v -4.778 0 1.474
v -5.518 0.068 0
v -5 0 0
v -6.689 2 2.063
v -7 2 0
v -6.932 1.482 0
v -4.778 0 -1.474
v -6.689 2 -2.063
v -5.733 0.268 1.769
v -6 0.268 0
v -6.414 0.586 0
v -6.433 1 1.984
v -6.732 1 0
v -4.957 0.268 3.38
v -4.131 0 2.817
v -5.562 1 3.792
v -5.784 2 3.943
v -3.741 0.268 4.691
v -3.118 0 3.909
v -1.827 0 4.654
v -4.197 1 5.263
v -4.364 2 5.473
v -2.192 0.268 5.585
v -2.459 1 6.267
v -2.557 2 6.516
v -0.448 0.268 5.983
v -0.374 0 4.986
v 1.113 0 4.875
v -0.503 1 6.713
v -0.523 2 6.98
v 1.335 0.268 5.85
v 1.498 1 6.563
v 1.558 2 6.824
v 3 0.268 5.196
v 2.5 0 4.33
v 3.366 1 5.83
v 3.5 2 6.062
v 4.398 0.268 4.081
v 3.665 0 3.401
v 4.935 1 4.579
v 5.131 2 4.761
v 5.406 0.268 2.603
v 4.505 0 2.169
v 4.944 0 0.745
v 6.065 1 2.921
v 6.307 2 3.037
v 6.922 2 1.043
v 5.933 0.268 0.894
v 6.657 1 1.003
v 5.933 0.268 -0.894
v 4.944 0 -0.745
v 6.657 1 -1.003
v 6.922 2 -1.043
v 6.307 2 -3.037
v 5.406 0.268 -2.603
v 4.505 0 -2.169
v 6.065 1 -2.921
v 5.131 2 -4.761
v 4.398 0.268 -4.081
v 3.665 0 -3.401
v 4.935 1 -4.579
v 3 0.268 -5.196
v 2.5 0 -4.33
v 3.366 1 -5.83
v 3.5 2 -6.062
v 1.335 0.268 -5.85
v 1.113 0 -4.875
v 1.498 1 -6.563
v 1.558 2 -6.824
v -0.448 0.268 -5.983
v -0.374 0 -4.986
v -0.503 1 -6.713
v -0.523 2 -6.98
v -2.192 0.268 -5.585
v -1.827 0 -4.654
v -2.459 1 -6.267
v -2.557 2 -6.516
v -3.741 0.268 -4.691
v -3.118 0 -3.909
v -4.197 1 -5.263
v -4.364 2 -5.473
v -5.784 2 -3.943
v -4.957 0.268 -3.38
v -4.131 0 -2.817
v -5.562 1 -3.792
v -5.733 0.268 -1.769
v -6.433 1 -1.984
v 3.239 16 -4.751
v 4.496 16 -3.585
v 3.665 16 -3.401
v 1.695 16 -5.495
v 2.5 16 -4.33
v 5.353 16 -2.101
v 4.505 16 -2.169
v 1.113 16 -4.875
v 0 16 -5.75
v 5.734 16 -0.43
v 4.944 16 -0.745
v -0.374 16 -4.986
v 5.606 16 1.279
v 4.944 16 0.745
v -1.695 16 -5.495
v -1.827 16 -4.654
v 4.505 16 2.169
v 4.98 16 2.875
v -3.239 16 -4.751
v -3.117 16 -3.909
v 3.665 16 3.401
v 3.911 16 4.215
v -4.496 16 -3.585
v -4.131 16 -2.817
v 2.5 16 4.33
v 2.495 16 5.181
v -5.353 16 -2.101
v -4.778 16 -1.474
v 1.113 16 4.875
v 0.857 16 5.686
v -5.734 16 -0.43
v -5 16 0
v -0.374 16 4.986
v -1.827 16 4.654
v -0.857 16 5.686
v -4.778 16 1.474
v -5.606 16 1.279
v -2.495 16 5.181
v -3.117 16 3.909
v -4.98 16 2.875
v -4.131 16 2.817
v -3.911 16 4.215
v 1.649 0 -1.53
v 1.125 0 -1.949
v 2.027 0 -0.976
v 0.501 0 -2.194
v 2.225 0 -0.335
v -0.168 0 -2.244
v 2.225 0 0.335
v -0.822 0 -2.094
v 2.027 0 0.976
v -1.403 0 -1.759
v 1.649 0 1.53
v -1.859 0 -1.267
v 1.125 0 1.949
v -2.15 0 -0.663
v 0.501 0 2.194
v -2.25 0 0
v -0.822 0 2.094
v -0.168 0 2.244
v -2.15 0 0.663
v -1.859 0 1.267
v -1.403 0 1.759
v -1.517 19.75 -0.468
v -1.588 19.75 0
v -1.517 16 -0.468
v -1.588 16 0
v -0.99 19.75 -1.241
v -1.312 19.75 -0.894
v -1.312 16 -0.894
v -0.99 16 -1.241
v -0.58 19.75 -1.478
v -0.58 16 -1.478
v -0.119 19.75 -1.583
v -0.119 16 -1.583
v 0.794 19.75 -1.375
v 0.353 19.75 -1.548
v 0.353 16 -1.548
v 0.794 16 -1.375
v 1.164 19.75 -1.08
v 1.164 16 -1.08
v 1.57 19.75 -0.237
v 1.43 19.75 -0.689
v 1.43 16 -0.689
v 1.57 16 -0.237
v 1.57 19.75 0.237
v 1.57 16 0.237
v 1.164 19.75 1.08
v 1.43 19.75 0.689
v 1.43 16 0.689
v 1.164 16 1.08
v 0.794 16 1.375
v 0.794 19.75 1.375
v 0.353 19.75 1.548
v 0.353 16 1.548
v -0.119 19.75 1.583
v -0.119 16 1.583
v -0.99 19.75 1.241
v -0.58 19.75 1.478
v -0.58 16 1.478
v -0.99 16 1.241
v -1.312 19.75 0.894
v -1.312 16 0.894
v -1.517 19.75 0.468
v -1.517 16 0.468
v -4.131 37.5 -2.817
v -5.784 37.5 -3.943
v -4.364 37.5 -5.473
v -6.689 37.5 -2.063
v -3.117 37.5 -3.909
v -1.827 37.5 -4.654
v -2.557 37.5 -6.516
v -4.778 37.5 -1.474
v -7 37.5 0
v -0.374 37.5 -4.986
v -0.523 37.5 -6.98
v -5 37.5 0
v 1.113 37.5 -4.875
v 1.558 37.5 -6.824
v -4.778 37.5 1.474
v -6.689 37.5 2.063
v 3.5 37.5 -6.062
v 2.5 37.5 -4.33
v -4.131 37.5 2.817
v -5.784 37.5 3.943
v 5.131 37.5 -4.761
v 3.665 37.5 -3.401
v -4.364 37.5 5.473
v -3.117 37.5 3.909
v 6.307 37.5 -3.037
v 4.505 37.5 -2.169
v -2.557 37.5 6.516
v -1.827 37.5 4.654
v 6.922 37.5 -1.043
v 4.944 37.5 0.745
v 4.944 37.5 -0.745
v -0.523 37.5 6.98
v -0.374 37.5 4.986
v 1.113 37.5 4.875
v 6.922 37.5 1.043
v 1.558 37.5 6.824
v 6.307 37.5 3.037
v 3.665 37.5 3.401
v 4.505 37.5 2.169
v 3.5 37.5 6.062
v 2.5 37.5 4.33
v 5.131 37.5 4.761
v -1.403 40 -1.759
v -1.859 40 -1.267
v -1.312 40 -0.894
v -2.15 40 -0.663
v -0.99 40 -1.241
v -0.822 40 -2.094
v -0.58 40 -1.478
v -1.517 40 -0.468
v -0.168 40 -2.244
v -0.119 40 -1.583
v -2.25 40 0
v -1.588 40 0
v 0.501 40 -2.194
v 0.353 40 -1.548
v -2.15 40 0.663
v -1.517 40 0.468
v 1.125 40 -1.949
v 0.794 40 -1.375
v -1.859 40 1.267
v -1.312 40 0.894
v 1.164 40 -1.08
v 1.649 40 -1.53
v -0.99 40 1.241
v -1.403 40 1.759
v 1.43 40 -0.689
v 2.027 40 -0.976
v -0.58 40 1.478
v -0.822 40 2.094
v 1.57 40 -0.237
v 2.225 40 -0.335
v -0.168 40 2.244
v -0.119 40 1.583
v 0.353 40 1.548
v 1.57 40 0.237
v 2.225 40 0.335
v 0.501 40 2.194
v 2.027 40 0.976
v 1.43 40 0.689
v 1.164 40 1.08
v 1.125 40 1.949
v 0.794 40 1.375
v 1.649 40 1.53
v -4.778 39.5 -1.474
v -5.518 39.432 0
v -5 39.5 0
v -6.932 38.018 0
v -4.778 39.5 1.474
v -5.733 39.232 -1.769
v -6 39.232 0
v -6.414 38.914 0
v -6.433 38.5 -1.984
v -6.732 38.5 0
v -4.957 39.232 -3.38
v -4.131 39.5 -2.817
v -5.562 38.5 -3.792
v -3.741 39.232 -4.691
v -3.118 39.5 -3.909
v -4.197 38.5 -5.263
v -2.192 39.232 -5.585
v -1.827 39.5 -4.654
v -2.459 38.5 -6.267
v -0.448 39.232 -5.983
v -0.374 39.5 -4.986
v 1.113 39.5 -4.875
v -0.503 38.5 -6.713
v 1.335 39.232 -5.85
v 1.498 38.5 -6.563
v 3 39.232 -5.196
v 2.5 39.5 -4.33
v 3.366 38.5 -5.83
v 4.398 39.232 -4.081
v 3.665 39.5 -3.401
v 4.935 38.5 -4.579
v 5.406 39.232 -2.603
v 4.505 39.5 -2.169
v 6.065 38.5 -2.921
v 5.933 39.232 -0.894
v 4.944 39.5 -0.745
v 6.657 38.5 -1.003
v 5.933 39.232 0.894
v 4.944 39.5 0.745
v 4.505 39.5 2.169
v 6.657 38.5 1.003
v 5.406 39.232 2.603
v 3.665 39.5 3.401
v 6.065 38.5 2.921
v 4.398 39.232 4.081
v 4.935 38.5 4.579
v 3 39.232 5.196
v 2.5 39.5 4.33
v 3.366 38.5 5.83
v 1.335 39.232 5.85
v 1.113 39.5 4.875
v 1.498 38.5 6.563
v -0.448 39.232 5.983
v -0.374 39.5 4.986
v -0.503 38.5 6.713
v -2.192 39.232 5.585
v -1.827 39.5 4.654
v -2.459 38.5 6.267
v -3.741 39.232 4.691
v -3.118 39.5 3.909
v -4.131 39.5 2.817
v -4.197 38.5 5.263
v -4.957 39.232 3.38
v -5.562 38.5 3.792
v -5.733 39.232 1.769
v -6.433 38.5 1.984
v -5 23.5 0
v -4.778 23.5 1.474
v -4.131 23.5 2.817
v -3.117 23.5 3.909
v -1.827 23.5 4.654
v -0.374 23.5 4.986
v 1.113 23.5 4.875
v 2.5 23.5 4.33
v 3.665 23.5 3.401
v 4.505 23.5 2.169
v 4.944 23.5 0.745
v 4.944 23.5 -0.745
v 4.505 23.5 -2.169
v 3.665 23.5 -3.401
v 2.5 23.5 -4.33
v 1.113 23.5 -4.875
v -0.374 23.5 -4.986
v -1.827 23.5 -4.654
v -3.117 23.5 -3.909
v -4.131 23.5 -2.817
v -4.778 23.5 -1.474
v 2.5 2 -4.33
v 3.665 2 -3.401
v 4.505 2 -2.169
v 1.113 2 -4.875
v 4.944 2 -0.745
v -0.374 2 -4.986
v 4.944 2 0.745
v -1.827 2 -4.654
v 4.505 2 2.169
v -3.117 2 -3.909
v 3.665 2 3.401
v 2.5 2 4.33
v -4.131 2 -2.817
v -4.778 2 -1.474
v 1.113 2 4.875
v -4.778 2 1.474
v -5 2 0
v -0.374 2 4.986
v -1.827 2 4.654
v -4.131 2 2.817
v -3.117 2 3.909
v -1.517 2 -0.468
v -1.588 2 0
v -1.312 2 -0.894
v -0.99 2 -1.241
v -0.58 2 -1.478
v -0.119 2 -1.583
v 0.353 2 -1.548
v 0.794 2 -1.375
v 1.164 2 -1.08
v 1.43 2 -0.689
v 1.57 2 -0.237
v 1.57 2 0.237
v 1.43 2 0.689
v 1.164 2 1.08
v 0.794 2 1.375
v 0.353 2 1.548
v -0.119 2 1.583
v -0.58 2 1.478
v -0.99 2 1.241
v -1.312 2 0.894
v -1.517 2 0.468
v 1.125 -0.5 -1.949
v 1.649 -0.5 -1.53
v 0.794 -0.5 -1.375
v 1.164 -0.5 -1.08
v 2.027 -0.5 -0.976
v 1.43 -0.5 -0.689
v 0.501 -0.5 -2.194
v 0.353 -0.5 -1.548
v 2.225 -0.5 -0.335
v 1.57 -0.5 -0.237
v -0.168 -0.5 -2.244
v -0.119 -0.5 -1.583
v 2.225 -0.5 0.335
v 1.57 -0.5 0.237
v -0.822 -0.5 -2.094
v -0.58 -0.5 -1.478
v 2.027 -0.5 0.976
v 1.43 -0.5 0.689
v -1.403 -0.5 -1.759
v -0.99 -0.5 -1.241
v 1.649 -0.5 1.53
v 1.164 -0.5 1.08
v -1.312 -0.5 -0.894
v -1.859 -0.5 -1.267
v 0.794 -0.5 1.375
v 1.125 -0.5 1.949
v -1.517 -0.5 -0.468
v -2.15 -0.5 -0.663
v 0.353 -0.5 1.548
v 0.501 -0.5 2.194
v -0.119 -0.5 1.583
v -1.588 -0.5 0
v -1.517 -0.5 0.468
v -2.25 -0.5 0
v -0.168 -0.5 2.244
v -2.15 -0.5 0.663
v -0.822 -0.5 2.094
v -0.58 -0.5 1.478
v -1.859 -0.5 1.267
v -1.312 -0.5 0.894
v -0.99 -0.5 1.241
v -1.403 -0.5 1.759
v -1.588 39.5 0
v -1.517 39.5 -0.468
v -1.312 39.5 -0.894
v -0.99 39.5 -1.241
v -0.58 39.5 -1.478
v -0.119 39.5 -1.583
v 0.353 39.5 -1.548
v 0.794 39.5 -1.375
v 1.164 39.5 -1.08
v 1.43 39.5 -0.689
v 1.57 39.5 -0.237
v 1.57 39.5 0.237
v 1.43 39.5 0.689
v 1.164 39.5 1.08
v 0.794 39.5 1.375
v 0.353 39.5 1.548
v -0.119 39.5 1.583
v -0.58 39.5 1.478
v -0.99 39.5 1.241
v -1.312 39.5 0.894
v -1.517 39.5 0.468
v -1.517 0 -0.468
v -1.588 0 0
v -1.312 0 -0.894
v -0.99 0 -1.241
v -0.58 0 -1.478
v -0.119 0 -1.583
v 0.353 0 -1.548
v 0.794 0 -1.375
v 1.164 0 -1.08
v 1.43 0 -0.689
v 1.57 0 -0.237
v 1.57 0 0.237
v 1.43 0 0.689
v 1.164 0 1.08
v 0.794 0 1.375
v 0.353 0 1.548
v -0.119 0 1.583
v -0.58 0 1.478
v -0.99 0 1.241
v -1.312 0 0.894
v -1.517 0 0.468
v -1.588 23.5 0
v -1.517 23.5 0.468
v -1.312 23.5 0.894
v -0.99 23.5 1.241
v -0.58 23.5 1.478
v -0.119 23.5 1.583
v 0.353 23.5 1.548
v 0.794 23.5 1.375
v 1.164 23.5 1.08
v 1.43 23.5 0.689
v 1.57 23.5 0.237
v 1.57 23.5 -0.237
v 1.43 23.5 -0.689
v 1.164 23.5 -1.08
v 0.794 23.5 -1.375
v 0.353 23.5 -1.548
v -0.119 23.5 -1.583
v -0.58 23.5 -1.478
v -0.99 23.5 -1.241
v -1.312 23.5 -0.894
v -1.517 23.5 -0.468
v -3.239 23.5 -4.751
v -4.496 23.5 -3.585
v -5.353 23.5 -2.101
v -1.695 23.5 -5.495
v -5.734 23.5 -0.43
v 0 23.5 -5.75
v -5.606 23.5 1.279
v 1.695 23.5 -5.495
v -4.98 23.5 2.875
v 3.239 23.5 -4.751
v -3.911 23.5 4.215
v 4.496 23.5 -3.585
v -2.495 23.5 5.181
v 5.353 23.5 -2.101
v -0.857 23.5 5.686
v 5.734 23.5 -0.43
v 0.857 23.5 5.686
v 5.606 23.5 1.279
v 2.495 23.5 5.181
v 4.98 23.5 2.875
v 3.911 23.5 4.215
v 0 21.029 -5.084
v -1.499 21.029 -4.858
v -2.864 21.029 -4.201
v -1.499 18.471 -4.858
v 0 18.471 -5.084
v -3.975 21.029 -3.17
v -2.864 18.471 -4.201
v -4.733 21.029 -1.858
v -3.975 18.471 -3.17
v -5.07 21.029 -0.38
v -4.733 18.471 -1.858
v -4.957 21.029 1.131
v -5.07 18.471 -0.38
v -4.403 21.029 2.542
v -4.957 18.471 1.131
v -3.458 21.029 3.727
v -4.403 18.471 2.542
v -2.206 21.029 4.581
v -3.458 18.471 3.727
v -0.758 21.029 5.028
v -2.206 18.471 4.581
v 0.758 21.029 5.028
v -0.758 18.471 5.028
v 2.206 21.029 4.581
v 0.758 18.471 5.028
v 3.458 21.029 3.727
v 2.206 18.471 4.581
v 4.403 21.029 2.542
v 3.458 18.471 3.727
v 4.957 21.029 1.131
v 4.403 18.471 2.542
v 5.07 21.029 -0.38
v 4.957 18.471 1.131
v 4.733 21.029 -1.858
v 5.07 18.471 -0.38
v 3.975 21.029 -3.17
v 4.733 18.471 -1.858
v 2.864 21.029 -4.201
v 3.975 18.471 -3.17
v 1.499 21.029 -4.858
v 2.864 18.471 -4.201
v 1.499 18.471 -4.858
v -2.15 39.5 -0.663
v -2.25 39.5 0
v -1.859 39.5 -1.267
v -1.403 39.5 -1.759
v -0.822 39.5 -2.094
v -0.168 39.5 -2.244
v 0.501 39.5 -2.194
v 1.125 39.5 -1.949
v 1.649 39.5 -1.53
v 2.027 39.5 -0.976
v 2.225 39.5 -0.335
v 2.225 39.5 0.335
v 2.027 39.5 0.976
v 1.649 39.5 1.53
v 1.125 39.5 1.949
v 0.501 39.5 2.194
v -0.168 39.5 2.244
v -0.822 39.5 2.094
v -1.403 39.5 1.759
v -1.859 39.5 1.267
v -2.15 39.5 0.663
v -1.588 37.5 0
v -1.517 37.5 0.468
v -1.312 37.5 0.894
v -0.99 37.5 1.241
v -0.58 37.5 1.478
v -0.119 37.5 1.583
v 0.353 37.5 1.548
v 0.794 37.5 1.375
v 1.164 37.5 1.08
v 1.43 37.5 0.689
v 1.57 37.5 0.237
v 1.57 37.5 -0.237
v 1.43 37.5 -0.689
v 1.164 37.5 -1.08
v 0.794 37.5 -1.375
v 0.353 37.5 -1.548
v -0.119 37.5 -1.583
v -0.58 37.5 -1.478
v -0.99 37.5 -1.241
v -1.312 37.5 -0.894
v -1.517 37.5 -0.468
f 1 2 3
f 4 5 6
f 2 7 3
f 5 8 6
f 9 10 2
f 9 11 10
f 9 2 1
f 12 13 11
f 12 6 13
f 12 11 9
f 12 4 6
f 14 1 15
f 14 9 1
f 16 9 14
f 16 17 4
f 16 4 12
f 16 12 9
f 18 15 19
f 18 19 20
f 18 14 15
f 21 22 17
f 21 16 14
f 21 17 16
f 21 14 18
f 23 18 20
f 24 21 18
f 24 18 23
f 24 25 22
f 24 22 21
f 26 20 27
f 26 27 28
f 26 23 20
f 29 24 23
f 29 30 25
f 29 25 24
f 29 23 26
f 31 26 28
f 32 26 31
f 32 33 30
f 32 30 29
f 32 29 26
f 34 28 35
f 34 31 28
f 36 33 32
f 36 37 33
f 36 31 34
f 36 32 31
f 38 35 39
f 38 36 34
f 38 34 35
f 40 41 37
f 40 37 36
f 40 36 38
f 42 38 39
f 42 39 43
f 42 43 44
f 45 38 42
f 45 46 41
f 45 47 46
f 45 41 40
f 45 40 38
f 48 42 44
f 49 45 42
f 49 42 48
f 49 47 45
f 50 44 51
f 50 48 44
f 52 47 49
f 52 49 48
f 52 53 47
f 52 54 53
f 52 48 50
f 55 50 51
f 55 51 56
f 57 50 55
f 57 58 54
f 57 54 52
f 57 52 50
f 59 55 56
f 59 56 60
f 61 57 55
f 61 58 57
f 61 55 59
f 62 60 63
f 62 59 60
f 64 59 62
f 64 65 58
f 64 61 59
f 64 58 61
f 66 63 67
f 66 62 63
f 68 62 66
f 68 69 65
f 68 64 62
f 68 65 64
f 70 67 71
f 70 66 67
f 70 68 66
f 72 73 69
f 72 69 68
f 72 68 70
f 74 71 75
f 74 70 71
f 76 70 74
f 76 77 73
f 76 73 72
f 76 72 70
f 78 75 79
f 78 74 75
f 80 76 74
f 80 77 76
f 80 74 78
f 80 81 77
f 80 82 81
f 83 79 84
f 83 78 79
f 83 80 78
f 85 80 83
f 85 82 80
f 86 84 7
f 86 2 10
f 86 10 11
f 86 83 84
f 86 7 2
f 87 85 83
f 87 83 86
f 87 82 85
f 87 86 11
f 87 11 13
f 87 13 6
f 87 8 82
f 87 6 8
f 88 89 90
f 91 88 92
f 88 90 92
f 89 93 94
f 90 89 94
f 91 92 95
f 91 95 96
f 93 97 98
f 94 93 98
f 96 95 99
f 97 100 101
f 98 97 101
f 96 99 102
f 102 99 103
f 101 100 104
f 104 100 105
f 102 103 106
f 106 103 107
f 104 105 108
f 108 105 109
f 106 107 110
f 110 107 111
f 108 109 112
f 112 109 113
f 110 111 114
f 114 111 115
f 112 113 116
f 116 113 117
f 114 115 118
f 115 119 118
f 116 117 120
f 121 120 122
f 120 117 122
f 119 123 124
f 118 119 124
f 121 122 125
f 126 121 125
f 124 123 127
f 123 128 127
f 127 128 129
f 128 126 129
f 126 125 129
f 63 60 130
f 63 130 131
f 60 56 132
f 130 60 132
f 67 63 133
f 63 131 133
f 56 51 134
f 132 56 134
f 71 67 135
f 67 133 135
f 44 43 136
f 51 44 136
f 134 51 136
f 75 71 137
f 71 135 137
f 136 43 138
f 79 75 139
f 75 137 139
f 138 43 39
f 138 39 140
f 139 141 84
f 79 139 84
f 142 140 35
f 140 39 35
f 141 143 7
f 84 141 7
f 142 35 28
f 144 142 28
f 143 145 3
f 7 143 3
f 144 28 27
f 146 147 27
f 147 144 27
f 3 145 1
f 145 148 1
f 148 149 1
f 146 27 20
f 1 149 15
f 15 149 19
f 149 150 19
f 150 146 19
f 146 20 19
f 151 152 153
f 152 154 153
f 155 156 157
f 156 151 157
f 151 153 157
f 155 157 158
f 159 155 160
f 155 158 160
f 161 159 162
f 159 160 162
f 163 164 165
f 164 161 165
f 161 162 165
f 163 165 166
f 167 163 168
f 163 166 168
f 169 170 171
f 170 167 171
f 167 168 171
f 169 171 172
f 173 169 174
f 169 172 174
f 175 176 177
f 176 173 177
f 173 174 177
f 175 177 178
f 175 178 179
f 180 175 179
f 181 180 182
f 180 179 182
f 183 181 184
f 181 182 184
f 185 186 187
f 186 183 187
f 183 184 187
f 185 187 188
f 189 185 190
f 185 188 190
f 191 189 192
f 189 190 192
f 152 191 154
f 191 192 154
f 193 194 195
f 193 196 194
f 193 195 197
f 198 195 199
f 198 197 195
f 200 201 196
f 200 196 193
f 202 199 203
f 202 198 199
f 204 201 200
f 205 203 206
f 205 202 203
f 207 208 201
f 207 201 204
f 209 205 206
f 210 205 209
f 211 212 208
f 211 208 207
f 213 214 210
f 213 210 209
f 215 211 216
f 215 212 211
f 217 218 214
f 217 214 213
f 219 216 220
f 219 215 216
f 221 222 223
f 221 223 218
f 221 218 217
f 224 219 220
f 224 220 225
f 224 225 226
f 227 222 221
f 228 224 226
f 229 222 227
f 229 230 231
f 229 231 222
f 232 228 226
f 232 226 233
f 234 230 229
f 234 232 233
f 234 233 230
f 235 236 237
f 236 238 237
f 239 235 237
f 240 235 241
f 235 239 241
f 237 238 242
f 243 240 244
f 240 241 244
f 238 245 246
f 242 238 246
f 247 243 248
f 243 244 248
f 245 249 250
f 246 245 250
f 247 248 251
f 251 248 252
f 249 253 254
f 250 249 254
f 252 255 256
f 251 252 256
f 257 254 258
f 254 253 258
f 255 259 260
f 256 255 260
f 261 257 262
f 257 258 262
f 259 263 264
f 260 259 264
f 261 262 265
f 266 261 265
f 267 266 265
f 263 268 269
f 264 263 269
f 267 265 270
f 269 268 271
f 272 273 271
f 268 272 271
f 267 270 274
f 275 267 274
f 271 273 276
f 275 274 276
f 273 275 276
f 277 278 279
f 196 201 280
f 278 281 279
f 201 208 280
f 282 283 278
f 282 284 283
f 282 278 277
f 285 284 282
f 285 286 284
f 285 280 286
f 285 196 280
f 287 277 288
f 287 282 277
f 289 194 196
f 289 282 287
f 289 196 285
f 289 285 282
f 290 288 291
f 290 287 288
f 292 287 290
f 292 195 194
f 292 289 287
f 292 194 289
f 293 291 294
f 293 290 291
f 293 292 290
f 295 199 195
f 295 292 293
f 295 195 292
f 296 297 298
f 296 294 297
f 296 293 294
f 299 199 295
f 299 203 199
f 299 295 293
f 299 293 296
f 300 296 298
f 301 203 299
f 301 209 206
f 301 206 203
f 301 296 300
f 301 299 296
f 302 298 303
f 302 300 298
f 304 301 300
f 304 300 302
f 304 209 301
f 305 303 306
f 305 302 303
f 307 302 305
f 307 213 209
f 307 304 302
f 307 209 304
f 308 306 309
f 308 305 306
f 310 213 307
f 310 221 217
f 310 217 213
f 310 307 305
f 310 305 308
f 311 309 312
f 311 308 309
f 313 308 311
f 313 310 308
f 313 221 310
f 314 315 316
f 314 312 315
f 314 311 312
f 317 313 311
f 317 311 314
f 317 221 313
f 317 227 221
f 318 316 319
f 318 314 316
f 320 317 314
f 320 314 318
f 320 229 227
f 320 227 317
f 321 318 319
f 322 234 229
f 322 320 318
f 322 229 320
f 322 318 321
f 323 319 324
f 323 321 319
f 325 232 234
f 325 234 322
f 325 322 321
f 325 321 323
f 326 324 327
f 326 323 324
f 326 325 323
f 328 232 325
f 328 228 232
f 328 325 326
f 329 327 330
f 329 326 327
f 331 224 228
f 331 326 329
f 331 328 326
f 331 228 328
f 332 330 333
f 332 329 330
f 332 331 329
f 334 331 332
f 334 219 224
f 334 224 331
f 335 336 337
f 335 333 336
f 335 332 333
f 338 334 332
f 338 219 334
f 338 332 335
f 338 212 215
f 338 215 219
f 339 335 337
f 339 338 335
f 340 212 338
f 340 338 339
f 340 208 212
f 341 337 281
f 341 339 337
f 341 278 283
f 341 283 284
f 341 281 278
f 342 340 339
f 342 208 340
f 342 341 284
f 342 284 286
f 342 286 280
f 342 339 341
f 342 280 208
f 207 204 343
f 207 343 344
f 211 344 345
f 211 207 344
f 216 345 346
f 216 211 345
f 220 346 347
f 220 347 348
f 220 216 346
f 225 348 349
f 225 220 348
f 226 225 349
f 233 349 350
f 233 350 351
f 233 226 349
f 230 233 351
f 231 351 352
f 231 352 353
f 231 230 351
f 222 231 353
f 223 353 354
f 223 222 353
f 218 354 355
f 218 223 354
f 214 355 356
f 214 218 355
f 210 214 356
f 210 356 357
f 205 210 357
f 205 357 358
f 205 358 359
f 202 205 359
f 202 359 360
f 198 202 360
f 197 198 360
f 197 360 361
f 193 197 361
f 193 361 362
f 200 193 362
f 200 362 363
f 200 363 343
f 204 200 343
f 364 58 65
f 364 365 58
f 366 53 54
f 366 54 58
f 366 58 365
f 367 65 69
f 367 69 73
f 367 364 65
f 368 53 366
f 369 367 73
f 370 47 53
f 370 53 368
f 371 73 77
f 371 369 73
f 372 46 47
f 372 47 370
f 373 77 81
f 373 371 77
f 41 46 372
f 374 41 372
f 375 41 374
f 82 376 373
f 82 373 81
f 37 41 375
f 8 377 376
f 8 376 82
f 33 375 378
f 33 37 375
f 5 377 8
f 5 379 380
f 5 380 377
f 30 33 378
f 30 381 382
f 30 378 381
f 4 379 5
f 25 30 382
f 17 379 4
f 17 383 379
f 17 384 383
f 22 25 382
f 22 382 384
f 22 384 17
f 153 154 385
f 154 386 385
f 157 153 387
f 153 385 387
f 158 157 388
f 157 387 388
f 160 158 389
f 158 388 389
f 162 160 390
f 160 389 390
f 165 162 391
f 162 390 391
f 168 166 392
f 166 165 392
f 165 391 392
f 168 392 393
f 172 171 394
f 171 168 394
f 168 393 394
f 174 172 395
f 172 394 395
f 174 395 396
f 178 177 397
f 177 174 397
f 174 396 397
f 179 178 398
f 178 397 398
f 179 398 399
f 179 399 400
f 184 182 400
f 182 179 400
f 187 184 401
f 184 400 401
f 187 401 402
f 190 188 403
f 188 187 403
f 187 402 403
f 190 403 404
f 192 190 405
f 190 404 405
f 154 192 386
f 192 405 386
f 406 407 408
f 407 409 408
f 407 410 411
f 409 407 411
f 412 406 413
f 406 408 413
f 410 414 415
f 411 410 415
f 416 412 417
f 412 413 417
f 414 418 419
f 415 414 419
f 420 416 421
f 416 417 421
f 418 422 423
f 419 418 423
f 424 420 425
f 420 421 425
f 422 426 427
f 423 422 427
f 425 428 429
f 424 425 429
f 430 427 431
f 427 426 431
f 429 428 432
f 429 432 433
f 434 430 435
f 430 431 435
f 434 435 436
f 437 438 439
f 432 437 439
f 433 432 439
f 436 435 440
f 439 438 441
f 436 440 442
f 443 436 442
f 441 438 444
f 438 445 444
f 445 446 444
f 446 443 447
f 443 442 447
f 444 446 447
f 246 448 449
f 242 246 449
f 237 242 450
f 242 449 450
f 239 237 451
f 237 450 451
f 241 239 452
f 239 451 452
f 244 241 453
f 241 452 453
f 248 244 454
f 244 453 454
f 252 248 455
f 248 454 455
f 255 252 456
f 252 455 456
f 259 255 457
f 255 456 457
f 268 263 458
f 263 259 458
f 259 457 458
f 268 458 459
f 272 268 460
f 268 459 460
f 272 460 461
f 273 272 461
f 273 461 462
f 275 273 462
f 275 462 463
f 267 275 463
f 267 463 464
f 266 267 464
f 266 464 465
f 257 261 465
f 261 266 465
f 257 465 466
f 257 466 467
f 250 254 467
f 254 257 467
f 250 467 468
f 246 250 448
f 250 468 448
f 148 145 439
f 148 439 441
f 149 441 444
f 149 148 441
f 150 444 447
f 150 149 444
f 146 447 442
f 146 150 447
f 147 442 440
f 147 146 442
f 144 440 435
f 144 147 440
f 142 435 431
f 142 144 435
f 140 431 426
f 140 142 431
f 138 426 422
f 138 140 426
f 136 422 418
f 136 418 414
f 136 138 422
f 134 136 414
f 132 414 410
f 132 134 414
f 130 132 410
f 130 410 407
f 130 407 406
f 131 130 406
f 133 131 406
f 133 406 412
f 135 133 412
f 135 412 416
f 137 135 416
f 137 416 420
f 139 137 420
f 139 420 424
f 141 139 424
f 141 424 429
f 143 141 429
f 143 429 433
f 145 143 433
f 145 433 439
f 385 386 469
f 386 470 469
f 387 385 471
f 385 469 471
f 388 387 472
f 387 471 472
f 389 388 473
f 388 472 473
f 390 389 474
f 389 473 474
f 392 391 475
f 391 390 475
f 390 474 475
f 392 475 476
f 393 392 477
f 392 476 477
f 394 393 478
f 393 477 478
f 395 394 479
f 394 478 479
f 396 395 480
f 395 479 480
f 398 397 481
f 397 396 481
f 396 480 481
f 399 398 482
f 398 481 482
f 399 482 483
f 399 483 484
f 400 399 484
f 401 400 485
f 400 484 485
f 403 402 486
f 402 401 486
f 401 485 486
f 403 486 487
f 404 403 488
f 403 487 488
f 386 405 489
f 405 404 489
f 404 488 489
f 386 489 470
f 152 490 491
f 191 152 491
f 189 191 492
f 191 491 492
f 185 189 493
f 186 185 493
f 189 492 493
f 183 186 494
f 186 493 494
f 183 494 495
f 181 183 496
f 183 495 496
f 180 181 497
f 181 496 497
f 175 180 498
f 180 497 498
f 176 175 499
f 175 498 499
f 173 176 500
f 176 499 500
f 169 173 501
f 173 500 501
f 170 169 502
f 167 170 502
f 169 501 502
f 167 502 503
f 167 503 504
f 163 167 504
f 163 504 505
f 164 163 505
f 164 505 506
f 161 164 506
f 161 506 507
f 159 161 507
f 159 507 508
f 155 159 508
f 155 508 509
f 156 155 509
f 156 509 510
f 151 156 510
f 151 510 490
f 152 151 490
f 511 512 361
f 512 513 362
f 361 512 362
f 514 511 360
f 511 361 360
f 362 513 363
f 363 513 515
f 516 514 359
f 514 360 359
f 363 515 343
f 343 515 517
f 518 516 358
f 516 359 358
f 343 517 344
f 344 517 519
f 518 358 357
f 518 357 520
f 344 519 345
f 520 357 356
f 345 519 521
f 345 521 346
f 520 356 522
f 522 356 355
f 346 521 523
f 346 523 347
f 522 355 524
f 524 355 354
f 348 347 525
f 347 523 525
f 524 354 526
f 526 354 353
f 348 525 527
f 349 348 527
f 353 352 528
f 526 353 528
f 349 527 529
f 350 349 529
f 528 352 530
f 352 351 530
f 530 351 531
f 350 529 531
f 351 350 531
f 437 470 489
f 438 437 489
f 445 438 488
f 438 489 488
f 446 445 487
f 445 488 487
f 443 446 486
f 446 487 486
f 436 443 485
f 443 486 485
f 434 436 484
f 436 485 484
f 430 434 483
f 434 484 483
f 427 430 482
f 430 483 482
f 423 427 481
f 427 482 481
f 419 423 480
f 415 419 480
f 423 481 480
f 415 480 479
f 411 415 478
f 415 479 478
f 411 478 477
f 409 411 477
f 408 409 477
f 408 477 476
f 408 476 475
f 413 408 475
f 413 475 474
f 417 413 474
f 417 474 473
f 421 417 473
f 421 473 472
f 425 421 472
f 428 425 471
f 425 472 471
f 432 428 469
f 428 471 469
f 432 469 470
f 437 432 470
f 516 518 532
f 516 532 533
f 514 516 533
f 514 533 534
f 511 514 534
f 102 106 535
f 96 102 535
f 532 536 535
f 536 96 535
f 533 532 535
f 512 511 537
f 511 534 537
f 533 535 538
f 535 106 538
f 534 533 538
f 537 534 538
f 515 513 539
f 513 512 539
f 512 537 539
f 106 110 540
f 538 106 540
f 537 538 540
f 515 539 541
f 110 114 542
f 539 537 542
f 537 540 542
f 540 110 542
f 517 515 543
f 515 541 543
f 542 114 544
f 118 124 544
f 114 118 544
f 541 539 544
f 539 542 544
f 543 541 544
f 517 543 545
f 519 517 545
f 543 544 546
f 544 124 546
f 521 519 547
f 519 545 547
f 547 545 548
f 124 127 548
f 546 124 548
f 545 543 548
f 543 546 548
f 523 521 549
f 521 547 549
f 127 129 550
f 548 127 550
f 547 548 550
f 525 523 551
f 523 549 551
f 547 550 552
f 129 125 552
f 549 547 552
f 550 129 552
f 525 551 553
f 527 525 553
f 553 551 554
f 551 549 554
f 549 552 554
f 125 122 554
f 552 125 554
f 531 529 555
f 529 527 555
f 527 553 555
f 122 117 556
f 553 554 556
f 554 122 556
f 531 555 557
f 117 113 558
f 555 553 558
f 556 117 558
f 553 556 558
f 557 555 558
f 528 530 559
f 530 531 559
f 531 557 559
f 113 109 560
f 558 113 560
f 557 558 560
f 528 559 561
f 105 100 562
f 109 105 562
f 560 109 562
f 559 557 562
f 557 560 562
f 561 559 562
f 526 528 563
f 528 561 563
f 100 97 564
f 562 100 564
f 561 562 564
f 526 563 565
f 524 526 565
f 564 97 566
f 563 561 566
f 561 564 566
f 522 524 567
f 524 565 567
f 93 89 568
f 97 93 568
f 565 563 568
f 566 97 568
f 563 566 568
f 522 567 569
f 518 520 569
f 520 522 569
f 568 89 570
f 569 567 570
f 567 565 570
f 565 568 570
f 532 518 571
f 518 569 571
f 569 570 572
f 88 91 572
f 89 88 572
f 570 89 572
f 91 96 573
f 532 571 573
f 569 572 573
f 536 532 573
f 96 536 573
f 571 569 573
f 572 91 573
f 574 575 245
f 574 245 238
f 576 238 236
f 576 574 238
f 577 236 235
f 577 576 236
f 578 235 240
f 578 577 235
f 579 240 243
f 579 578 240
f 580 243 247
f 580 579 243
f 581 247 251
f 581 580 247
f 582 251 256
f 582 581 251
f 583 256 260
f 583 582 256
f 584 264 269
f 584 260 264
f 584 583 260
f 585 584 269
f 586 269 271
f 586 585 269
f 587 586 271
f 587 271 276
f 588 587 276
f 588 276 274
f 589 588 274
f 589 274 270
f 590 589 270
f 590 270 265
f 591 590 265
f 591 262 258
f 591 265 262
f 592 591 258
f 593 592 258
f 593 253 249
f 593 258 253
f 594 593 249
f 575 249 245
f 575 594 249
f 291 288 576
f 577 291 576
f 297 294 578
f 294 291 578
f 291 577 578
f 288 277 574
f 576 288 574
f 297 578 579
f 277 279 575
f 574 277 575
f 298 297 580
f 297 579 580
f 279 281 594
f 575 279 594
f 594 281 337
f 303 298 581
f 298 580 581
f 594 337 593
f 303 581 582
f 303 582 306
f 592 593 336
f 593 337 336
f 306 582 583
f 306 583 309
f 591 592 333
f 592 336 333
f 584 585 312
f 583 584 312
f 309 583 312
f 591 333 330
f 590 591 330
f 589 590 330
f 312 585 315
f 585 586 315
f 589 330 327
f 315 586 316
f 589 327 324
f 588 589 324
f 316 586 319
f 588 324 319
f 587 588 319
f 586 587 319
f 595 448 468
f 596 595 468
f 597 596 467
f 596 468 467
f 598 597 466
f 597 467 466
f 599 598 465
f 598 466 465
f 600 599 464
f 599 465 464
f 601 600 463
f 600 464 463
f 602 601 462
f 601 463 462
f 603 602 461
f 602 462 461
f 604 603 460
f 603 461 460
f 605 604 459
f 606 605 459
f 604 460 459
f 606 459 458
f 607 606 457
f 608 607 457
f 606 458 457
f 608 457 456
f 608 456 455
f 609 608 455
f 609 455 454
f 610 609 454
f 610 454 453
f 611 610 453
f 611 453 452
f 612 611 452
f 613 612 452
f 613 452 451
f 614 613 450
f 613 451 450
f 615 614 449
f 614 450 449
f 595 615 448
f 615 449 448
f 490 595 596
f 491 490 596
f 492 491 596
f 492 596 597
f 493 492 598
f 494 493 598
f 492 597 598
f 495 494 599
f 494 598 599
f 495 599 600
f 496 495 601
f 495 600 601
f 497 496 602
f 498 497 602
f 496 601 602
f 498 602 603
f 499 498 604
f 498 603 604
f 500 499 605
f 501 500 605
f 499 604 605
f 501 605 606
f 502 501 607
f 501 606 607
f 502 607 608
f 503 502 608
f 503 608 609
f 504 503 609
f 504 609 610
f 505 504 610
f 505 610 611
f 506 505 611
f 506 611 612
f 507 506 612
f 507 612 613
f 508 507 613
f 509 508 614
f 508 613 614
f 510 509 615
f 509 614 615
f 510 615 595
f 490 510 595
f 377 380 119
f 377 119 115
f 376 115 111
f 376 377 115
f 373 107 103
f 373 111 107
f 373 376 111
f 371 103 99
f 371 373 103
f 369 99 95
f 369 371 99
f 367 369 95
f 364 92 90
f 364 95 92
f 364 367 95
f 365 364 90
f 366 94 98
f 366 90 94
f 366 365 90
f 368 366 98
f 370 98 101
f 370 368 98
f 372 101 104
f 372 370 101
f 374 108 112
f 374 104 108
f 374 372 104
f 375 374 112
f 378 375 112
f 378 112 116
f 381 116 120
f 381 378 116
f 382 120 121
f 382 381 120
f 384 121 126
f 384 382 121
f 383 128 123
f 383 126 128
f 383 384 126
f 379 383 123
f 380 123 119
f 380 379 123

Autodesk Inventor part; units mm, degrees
ref_plane "YZ Plane" through (0, 0, 0) normal (1, 0, 0) x (0, 1, 0)
ref_plane "XZ Plane" through (0, 0, 0) normal (0, 1, 0) x (-1, 0, 0)
ref_plane "XY Plane" through (0, 0, 0) normal (0, 0, 1) x (1, 0, 0)
sketch "Sketch1" plane through (0, 0, 0) normal (0, 1, 0) x (-1, 0, 0)
  circle A0 centre (0, 0) radius 1.5875
  circle A1 centre (0, 0) radius 2.25
  circle A2 centre (0, 0) radius 7
  circle A3 centre (0, 0) radius 5
  circle A4 centre (0, 0) radius 5.75
  dimension "d0" = 3.175
  dimension "d1" = 4.5
  dimension "d2" = 14
  dimension "d3" = 10
  dimension "d4" = 11.5
extrude "Extrusion1" add sketch "Sketch1" against normal blind 0.5 contours A1
extrude "Extrusion2" add sketch "Sketch1" along normal blind 2 contours A1 | A2 | A3 | A4
extrude "Extrusion3" add sketch "Sketch1" along normal blind 14 from surface at 2 contours A1 | A3
extrude "Extrusion4" add sketch "Sketch1" along normal blind 3.75 from surface at 16 contours A1 | A3 | A4
fillet "Fillet1" radius 2 1 edges at (7, 0, 0)
mirror "Mirror1" about plane through (0, 19.75, 0) normal (0, 1, 0)
sketch "Sketch2" plane through (0, 0, 0) normal (1, 0, 0) x (0, 1, 0)
  line L0 (16, -5.75) -> (23.5, -5.75) projected
  line L1 (16, 5.75) -> (16, -5.75) projected
  arc A0 (23.5, -5.75) -> (16, -5.75) centre (19.75, -14.75) ccw
  line L2 (0, 0) -> (10, 0) construction
  point P0 (19.75, -5.75)
  point P1 (19.75, -5)
  dimension "d14" = 0.75
  dimension "d15" = 10
revolve "Revolution1" cut sketch "Sketch2" angle 360 about axis through (0, 0, 0) along (0, 1, 0)
properties part number "Dribbler Roller Seperator"
